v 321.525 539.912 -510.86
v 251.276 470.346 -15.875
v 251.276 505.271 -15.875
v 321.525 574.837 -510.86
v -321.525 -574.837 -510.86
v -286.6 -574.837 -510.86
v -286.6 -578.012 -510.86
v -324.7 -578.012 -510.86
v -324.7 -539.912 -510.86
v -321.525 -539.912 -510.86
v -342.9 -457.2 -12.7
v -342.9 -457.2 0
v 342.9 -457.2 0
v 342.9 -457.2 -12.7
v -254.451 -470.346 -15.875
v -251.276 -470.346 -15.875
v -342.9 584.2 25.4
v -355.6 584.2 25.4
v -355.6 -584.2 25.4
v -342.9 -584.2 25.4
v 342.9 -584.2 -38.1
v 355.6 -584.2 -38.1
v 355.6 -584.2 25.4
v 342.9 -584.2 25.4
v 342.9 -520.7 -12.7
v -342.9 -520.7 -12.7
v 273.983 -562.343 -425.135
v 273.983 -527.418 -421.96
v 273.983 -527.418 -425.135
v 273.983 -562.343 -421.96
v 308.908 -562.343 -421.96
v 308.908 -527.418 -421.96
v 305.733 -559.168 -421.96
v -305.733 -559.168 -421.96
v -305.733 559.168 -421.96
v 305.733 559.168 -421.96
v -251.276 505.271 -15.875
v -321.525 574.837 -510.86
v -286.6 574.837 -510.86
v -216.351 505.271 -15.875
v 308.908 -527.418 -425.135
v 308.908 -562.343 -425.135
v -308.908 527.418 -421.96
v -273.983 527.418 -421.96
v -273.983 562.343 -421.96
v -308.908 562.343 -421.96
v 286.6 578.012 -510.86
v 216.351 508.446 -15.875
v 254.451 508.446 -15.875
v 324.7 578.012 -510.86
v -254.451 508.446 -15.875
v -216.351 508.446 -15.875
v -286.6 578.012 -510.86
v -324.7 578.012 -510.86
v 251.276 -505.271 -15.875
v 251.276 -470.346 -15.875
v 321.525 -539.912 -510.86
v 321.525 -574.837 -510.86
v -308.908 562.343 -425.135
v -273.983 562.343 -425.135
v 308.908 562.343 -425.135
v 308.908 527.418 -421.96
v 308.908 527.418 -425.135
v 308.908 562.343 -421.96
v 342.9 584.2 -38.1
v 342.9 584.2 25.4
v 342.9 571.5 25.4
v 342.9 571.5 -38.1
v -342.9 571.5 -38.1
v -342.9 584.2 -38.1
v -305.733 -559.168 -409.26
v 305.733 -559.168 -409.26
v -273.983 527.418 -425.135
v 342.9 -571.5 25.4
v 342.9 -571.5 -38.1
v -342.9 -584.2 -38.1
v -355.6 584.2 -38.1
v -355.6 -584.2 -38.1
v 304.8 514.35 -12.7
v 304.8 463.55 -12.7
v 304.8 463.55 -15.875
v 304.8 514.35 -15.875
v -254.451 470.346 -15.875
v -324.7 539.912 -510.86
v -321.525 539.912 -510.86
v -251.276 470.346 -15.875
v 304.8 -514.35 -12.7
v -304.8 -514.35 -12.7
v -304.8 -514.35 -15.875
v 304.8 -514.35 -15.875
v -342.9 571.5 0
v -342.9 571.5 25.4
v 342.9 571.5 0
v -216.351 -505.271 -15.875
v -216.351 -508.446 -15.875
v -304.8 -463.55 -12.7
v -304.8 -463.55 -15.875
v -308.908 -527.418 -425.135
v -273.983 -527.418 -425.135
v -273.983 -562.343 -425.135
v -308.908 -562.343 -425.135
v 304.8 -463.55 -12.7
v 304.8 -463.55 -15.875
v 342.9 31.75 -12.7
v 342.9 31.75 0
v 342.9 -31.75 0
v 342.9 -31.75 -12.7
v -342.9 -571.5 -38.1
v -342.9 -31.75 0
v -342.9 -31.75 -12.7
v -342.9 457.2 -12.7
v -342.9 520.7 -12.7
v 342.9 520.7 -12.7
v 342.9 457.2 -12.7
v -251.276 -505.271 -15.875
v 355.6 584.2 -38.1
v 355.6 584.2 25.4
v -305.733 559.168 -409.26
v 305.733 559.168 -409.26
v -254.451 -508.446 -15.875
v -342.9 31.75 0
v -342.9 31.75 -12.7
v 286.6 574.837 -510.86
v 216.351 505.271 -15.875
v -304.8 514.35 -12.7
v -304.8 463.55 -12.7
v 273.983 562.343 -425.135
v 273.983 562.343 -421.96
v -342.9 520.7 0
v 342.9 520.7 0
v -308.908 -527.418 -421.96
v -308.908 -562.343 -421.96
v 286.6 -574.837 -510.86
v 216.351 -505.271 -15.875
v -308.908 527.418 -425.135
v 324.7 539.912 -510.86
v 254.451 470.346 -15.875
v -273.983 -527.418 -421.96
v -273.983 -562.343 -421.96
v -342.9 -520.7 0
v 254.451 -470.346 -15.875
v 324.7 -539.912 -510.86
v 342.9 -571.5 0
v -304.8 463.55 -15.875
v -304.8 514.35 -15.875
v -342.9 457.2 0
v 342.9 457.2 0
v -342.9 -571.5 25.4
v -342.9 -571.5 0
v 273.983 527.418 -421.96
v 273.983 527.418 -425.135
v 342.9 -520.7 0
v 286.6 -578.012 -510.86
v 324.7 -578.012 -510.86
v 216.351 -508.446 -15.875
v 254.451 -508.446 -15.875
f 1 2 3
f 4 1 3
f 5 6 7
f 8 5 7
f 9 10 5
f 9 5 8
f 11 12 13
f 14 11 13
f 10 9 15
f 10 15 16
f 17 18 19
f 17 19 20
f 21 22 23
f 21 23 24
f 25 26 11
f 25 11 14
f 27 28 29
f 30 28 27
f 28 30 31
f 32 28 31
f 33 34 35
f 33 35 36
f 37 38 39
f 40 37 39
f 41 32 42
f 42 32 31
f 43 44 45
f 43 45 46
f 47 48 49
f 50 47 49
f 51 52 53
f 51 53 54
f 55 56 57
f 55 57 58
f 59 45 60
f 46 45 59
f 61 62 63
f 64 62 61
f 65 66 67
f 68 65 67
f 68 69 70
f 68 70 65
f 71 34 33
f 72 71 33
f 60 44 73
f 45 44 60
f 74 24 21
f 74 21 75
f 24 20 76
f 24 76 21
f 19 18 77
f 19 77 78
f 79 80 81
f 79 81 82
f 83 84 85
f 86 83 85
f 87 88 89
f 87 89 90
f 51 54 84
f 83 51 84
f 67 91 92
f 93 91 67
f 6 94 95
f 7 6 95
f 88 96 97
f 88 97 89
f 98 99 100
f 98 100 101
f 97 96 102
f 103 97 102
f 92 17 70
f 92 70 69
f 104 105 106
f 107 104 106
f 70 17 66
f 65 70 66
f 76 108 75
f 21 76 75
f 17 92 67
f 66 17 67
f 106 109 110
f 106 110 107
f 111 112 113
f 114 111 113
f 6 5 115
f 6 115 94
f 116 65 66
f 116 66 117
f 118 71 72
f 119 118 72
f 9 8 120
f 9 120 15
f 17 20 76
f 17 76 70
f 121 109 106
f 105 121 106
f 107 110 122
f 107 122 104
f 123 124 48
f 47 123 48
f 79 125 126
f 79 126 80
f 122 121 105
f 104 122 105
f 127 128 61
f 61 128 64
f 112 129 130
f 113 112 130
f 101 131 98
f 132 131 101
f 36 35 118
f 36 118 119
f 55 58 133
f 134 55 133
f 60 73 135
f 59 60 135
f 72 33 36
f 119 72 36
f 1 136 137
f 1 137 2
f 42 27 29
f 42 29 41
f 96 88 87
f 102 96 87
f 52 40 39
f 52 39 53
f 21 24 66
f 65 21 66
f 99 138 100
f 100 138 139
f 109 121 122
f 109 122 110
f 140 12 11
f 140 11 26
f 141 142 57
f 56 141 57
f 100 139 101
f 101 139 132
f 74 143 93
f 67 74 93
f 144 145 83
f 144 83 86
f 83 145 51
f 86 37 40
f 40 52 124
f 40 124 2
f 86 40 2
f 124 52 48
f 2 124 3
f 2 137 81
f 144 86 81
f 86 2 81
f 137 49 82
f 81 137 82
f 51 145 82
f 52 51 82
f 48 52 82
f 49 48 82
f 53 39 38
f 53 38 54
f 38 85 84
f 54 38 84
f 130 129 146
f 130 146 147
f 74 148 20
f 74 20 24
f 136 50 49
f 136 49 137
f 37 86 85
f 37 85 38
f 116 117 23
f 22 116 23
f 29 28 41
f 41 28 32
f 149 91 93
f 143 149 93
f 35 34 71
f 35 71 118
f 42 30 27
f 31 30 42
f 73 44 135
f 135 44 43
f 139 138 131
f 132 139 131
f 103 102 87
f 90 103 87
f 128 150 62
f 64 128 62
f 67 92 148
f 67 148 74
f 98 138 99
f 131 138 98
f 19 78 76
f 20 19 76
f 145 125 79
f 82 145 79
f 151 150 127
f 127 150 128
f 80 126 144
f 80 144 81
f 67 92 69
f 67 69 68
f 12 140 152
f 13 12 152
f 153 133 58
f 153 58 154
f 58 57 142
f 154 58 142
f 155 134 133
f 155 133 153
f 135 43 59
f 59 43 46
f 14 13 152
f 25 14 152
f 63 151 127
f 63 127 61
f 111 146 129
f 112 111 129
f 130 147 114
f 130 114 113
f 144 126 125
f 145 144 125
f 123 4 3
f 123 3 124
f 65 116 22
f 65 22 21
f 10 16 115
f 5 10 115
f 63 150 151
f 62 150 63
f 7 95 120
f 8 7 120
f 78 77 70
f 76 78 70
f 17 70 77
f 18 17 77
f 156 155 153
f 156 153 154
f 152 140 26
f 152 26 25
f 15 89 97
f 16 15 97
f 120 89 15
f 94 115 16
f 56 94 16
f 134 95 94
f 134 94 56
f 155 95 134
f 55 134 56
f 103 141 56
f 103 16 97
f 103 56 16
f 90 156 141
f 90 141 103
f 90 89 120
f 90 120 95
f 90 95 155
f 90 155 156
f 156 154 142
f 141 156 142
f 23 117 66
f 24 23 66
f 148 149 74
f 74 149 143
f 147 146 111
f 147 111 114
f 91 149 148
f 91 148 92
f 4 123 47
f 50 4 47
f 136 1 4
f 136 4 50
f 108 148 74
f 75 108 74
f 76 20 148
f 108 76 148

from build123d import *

# Parameters (mm, degrees)
F0_W      = 685.8
F0_H      = 1143
F1_DEPTH  = 25.4
F2_W      = 685.8
F2_H      = 12.7
F3_DEPTH  = 63.5
F4_DEPTH  = 63.5
F7_W      = 685.8
F7_H      = 63.5
F8_DEPTH  = 12.7
F13_W     = 609.6
F13_H     = 50.8
F14_DEPTH = 3.175
F18_DEPTH = 3.175
F21_W     = 34.925
F21_H     = 34.925
F22_DEPTH = 3.175
F25_W     = 611.4661372068
F25_H     = 1118.335616345
F26_DEPTH = 12.7


# Not quite as in the source:
# - a feature of the source that left no trace in its solid (it failed there, or was rolled back) is left out


with BuildPart() as f1:
    # F0 (on Top) → F1 (new body)
    with BuildSketch(Plane.XY):
        Rectangle(F0_W, F0_H)
    extrude(amount=F1_DEPTH)


with BuildPart() as f3:
    # F2 (on face) → F3 (new body)
    with BuildSketch(Plane.XY.offset(25.4)):
        with Locations((0, -577.85)):
            Rectangle(F2_W, F2_H)
    extrude(amount=-F3_DEPTH)


with BuildPart() as f4:
    # F2 (on face) → F4 (new body)
    with BuildSketch(Plane.XY.offset(25.4)):
        Polygon((-342.9, -584.2), (-342.9, -571.5), (-342.9, 571.5), (-342.9, 584.2), (-355.6, 584.2), (-355.6, -584.2), align=None)
    extrude(amount=-F4_DEPTH)


with BuildPart() as f5_1:
    # F5: instance of F4
    add(f4.part.mirror(Plane.YZ))


with BuildPart() as f6_1:
    # F6: instance of F3
    add(f3.part.mirror(Plane.XZ))


with BuildPart() as f8:
    # F7 (on face) → F8 (new body)
    with BuildSketch(Plane(origin=(0, 0, 0), x_dir=(1, 0, 0), z_dir=(0, 0, -1))):
        with Locations((0, 488.95)):
            Rectangle(F7_W, F7_H)
    extrude(amount=F8_DEPTH)


with BuildPart() as f8b:
    # F7 (on face) → F8, piece 2 (new body)
    with BuildSketch(Plane(origin=(0, 0, 0), x_dir=(1, 0, 0), z_dir=(0, 0, -1))):
        Rectangle(F7_W, F7_H)
    extrude(amount=F8_DEPTH)


with BuildPart() as f12:
    # F12: sweep along a path in F11
    with BuildLine(Plane(origin=(0, -496.4101735589, 69.7659001467), x_dir=(1, 0, 0), z_dir=(0, -0.9902680687, 0.139173101))) as f12_path:
        Line((-254, -83.2763397607), (-324.6999352877, -586.3325186814))
    # F9 (on face) → F12 (sweep)
    with BuildSketch(Plane(origin=(0, 0, -12.7), x_dir=(1, 0, 0), z_dir=(0, 0, -1))):
        Polygon((-254, 508), (-254, 469.9), (-250.825, 469.9), (-250.825, 504.825), (-215.9, 504.825), (-215.9, 508), align=None)
    sweep(path=f12_path.line)

    # F13 (on face) → F14 (join)
    with BuildSketch(Plane(origin=(0, 0, -12.7), x_dir=(1, 0, 0), z_dir=(0, 0, -1))):
        with Locations((0, 488.95)):
            Rectangle(F13_W, F13_H)
    extrude(amount=F14_DEPTH)

    # F16: F12 across plane


with BuildPart() as f12_1:
    add(f12.part)
    add(f12.part.mirror(Plane.YZ))


with BuildPart() as f18:
    # F17 (on face) → F18 (new body)
    with BuildSketch(Plane(origin=(0, -493.2966706166, 69.3283258444), x_dir=(-1, 0, 0), z_dir=(0, 0.9902680687, -0.139173101))):
        Polygon((297.1001110228, -412.0989890367), (-263.6480910569, -174.0754990191), (-267.1830878213, -199.2283079651), (301.0836328718, -440.4432197893), align=None)
    extrude(amount=F18_DEPTH)


with BuildPart() as f19_1:
    # F19: instance of F18
    add(f18.part.mirror(Plane.YZ))


with BuildPart() as f22:
    # F21 (on offset) → F22 (new body)
    with BuildSketch(Plane(origin=(0, 0, -421.9604707683), x_dir=(1, 0, 0), z_dir=(0, 0, -1))):
        with Locations((291.4455686034, 544.8803081725)):
            Rectangle(F21_W, F21_H)
    extrude(amount=F22_DEPTH)


with BuildPart() as f23_1:
    # F23: instance of F22
    add(f22.part.mirror(Plane.YZ))


with BuildPart() as f24_1:
    # F24: instance of F8
    add(f8.part.mirror(Plane.XZ))


with BuildPart() as f24_2:
    # F24: instance of F12
    add(f12_1.part.mirror(Plane.XZ))


with BuildPart() as f24_3:
    # F24: instance of F19_1
    add(f19_1.part.mirror(Plane.XZ))


with BuildPart() as f24_4:
    # F24: instance of F18
    add(f18.part.mirror(Plane.XZ))


with BuildPart() as f24_5:
    # F24: instance of F23_1
    add(f23_1.part.mirror(Plane.XZ))


with BuildPart() as f24_6:
    # F24: instance of F22
    add(f22.part.mirror(Plane.XZ))


with BuildPart() as f26:
    # F25 (on face) → F26 (new body)
    with BuildSketch(Plane.XY.offset(-421.9604707683)):
        Rectangle(F25_W, F25_H)
    extrude(amount=F26_DEPTH)


solid = Compound([f1.part, f3.part, f4.part, f5_1.part, f6_1.part, f8.part, f8b.part, f12_1.part, f22.part, f23_1.part, f24_1.part, f24_2.part, f24_5.part, f24_6.part, f26.part])
